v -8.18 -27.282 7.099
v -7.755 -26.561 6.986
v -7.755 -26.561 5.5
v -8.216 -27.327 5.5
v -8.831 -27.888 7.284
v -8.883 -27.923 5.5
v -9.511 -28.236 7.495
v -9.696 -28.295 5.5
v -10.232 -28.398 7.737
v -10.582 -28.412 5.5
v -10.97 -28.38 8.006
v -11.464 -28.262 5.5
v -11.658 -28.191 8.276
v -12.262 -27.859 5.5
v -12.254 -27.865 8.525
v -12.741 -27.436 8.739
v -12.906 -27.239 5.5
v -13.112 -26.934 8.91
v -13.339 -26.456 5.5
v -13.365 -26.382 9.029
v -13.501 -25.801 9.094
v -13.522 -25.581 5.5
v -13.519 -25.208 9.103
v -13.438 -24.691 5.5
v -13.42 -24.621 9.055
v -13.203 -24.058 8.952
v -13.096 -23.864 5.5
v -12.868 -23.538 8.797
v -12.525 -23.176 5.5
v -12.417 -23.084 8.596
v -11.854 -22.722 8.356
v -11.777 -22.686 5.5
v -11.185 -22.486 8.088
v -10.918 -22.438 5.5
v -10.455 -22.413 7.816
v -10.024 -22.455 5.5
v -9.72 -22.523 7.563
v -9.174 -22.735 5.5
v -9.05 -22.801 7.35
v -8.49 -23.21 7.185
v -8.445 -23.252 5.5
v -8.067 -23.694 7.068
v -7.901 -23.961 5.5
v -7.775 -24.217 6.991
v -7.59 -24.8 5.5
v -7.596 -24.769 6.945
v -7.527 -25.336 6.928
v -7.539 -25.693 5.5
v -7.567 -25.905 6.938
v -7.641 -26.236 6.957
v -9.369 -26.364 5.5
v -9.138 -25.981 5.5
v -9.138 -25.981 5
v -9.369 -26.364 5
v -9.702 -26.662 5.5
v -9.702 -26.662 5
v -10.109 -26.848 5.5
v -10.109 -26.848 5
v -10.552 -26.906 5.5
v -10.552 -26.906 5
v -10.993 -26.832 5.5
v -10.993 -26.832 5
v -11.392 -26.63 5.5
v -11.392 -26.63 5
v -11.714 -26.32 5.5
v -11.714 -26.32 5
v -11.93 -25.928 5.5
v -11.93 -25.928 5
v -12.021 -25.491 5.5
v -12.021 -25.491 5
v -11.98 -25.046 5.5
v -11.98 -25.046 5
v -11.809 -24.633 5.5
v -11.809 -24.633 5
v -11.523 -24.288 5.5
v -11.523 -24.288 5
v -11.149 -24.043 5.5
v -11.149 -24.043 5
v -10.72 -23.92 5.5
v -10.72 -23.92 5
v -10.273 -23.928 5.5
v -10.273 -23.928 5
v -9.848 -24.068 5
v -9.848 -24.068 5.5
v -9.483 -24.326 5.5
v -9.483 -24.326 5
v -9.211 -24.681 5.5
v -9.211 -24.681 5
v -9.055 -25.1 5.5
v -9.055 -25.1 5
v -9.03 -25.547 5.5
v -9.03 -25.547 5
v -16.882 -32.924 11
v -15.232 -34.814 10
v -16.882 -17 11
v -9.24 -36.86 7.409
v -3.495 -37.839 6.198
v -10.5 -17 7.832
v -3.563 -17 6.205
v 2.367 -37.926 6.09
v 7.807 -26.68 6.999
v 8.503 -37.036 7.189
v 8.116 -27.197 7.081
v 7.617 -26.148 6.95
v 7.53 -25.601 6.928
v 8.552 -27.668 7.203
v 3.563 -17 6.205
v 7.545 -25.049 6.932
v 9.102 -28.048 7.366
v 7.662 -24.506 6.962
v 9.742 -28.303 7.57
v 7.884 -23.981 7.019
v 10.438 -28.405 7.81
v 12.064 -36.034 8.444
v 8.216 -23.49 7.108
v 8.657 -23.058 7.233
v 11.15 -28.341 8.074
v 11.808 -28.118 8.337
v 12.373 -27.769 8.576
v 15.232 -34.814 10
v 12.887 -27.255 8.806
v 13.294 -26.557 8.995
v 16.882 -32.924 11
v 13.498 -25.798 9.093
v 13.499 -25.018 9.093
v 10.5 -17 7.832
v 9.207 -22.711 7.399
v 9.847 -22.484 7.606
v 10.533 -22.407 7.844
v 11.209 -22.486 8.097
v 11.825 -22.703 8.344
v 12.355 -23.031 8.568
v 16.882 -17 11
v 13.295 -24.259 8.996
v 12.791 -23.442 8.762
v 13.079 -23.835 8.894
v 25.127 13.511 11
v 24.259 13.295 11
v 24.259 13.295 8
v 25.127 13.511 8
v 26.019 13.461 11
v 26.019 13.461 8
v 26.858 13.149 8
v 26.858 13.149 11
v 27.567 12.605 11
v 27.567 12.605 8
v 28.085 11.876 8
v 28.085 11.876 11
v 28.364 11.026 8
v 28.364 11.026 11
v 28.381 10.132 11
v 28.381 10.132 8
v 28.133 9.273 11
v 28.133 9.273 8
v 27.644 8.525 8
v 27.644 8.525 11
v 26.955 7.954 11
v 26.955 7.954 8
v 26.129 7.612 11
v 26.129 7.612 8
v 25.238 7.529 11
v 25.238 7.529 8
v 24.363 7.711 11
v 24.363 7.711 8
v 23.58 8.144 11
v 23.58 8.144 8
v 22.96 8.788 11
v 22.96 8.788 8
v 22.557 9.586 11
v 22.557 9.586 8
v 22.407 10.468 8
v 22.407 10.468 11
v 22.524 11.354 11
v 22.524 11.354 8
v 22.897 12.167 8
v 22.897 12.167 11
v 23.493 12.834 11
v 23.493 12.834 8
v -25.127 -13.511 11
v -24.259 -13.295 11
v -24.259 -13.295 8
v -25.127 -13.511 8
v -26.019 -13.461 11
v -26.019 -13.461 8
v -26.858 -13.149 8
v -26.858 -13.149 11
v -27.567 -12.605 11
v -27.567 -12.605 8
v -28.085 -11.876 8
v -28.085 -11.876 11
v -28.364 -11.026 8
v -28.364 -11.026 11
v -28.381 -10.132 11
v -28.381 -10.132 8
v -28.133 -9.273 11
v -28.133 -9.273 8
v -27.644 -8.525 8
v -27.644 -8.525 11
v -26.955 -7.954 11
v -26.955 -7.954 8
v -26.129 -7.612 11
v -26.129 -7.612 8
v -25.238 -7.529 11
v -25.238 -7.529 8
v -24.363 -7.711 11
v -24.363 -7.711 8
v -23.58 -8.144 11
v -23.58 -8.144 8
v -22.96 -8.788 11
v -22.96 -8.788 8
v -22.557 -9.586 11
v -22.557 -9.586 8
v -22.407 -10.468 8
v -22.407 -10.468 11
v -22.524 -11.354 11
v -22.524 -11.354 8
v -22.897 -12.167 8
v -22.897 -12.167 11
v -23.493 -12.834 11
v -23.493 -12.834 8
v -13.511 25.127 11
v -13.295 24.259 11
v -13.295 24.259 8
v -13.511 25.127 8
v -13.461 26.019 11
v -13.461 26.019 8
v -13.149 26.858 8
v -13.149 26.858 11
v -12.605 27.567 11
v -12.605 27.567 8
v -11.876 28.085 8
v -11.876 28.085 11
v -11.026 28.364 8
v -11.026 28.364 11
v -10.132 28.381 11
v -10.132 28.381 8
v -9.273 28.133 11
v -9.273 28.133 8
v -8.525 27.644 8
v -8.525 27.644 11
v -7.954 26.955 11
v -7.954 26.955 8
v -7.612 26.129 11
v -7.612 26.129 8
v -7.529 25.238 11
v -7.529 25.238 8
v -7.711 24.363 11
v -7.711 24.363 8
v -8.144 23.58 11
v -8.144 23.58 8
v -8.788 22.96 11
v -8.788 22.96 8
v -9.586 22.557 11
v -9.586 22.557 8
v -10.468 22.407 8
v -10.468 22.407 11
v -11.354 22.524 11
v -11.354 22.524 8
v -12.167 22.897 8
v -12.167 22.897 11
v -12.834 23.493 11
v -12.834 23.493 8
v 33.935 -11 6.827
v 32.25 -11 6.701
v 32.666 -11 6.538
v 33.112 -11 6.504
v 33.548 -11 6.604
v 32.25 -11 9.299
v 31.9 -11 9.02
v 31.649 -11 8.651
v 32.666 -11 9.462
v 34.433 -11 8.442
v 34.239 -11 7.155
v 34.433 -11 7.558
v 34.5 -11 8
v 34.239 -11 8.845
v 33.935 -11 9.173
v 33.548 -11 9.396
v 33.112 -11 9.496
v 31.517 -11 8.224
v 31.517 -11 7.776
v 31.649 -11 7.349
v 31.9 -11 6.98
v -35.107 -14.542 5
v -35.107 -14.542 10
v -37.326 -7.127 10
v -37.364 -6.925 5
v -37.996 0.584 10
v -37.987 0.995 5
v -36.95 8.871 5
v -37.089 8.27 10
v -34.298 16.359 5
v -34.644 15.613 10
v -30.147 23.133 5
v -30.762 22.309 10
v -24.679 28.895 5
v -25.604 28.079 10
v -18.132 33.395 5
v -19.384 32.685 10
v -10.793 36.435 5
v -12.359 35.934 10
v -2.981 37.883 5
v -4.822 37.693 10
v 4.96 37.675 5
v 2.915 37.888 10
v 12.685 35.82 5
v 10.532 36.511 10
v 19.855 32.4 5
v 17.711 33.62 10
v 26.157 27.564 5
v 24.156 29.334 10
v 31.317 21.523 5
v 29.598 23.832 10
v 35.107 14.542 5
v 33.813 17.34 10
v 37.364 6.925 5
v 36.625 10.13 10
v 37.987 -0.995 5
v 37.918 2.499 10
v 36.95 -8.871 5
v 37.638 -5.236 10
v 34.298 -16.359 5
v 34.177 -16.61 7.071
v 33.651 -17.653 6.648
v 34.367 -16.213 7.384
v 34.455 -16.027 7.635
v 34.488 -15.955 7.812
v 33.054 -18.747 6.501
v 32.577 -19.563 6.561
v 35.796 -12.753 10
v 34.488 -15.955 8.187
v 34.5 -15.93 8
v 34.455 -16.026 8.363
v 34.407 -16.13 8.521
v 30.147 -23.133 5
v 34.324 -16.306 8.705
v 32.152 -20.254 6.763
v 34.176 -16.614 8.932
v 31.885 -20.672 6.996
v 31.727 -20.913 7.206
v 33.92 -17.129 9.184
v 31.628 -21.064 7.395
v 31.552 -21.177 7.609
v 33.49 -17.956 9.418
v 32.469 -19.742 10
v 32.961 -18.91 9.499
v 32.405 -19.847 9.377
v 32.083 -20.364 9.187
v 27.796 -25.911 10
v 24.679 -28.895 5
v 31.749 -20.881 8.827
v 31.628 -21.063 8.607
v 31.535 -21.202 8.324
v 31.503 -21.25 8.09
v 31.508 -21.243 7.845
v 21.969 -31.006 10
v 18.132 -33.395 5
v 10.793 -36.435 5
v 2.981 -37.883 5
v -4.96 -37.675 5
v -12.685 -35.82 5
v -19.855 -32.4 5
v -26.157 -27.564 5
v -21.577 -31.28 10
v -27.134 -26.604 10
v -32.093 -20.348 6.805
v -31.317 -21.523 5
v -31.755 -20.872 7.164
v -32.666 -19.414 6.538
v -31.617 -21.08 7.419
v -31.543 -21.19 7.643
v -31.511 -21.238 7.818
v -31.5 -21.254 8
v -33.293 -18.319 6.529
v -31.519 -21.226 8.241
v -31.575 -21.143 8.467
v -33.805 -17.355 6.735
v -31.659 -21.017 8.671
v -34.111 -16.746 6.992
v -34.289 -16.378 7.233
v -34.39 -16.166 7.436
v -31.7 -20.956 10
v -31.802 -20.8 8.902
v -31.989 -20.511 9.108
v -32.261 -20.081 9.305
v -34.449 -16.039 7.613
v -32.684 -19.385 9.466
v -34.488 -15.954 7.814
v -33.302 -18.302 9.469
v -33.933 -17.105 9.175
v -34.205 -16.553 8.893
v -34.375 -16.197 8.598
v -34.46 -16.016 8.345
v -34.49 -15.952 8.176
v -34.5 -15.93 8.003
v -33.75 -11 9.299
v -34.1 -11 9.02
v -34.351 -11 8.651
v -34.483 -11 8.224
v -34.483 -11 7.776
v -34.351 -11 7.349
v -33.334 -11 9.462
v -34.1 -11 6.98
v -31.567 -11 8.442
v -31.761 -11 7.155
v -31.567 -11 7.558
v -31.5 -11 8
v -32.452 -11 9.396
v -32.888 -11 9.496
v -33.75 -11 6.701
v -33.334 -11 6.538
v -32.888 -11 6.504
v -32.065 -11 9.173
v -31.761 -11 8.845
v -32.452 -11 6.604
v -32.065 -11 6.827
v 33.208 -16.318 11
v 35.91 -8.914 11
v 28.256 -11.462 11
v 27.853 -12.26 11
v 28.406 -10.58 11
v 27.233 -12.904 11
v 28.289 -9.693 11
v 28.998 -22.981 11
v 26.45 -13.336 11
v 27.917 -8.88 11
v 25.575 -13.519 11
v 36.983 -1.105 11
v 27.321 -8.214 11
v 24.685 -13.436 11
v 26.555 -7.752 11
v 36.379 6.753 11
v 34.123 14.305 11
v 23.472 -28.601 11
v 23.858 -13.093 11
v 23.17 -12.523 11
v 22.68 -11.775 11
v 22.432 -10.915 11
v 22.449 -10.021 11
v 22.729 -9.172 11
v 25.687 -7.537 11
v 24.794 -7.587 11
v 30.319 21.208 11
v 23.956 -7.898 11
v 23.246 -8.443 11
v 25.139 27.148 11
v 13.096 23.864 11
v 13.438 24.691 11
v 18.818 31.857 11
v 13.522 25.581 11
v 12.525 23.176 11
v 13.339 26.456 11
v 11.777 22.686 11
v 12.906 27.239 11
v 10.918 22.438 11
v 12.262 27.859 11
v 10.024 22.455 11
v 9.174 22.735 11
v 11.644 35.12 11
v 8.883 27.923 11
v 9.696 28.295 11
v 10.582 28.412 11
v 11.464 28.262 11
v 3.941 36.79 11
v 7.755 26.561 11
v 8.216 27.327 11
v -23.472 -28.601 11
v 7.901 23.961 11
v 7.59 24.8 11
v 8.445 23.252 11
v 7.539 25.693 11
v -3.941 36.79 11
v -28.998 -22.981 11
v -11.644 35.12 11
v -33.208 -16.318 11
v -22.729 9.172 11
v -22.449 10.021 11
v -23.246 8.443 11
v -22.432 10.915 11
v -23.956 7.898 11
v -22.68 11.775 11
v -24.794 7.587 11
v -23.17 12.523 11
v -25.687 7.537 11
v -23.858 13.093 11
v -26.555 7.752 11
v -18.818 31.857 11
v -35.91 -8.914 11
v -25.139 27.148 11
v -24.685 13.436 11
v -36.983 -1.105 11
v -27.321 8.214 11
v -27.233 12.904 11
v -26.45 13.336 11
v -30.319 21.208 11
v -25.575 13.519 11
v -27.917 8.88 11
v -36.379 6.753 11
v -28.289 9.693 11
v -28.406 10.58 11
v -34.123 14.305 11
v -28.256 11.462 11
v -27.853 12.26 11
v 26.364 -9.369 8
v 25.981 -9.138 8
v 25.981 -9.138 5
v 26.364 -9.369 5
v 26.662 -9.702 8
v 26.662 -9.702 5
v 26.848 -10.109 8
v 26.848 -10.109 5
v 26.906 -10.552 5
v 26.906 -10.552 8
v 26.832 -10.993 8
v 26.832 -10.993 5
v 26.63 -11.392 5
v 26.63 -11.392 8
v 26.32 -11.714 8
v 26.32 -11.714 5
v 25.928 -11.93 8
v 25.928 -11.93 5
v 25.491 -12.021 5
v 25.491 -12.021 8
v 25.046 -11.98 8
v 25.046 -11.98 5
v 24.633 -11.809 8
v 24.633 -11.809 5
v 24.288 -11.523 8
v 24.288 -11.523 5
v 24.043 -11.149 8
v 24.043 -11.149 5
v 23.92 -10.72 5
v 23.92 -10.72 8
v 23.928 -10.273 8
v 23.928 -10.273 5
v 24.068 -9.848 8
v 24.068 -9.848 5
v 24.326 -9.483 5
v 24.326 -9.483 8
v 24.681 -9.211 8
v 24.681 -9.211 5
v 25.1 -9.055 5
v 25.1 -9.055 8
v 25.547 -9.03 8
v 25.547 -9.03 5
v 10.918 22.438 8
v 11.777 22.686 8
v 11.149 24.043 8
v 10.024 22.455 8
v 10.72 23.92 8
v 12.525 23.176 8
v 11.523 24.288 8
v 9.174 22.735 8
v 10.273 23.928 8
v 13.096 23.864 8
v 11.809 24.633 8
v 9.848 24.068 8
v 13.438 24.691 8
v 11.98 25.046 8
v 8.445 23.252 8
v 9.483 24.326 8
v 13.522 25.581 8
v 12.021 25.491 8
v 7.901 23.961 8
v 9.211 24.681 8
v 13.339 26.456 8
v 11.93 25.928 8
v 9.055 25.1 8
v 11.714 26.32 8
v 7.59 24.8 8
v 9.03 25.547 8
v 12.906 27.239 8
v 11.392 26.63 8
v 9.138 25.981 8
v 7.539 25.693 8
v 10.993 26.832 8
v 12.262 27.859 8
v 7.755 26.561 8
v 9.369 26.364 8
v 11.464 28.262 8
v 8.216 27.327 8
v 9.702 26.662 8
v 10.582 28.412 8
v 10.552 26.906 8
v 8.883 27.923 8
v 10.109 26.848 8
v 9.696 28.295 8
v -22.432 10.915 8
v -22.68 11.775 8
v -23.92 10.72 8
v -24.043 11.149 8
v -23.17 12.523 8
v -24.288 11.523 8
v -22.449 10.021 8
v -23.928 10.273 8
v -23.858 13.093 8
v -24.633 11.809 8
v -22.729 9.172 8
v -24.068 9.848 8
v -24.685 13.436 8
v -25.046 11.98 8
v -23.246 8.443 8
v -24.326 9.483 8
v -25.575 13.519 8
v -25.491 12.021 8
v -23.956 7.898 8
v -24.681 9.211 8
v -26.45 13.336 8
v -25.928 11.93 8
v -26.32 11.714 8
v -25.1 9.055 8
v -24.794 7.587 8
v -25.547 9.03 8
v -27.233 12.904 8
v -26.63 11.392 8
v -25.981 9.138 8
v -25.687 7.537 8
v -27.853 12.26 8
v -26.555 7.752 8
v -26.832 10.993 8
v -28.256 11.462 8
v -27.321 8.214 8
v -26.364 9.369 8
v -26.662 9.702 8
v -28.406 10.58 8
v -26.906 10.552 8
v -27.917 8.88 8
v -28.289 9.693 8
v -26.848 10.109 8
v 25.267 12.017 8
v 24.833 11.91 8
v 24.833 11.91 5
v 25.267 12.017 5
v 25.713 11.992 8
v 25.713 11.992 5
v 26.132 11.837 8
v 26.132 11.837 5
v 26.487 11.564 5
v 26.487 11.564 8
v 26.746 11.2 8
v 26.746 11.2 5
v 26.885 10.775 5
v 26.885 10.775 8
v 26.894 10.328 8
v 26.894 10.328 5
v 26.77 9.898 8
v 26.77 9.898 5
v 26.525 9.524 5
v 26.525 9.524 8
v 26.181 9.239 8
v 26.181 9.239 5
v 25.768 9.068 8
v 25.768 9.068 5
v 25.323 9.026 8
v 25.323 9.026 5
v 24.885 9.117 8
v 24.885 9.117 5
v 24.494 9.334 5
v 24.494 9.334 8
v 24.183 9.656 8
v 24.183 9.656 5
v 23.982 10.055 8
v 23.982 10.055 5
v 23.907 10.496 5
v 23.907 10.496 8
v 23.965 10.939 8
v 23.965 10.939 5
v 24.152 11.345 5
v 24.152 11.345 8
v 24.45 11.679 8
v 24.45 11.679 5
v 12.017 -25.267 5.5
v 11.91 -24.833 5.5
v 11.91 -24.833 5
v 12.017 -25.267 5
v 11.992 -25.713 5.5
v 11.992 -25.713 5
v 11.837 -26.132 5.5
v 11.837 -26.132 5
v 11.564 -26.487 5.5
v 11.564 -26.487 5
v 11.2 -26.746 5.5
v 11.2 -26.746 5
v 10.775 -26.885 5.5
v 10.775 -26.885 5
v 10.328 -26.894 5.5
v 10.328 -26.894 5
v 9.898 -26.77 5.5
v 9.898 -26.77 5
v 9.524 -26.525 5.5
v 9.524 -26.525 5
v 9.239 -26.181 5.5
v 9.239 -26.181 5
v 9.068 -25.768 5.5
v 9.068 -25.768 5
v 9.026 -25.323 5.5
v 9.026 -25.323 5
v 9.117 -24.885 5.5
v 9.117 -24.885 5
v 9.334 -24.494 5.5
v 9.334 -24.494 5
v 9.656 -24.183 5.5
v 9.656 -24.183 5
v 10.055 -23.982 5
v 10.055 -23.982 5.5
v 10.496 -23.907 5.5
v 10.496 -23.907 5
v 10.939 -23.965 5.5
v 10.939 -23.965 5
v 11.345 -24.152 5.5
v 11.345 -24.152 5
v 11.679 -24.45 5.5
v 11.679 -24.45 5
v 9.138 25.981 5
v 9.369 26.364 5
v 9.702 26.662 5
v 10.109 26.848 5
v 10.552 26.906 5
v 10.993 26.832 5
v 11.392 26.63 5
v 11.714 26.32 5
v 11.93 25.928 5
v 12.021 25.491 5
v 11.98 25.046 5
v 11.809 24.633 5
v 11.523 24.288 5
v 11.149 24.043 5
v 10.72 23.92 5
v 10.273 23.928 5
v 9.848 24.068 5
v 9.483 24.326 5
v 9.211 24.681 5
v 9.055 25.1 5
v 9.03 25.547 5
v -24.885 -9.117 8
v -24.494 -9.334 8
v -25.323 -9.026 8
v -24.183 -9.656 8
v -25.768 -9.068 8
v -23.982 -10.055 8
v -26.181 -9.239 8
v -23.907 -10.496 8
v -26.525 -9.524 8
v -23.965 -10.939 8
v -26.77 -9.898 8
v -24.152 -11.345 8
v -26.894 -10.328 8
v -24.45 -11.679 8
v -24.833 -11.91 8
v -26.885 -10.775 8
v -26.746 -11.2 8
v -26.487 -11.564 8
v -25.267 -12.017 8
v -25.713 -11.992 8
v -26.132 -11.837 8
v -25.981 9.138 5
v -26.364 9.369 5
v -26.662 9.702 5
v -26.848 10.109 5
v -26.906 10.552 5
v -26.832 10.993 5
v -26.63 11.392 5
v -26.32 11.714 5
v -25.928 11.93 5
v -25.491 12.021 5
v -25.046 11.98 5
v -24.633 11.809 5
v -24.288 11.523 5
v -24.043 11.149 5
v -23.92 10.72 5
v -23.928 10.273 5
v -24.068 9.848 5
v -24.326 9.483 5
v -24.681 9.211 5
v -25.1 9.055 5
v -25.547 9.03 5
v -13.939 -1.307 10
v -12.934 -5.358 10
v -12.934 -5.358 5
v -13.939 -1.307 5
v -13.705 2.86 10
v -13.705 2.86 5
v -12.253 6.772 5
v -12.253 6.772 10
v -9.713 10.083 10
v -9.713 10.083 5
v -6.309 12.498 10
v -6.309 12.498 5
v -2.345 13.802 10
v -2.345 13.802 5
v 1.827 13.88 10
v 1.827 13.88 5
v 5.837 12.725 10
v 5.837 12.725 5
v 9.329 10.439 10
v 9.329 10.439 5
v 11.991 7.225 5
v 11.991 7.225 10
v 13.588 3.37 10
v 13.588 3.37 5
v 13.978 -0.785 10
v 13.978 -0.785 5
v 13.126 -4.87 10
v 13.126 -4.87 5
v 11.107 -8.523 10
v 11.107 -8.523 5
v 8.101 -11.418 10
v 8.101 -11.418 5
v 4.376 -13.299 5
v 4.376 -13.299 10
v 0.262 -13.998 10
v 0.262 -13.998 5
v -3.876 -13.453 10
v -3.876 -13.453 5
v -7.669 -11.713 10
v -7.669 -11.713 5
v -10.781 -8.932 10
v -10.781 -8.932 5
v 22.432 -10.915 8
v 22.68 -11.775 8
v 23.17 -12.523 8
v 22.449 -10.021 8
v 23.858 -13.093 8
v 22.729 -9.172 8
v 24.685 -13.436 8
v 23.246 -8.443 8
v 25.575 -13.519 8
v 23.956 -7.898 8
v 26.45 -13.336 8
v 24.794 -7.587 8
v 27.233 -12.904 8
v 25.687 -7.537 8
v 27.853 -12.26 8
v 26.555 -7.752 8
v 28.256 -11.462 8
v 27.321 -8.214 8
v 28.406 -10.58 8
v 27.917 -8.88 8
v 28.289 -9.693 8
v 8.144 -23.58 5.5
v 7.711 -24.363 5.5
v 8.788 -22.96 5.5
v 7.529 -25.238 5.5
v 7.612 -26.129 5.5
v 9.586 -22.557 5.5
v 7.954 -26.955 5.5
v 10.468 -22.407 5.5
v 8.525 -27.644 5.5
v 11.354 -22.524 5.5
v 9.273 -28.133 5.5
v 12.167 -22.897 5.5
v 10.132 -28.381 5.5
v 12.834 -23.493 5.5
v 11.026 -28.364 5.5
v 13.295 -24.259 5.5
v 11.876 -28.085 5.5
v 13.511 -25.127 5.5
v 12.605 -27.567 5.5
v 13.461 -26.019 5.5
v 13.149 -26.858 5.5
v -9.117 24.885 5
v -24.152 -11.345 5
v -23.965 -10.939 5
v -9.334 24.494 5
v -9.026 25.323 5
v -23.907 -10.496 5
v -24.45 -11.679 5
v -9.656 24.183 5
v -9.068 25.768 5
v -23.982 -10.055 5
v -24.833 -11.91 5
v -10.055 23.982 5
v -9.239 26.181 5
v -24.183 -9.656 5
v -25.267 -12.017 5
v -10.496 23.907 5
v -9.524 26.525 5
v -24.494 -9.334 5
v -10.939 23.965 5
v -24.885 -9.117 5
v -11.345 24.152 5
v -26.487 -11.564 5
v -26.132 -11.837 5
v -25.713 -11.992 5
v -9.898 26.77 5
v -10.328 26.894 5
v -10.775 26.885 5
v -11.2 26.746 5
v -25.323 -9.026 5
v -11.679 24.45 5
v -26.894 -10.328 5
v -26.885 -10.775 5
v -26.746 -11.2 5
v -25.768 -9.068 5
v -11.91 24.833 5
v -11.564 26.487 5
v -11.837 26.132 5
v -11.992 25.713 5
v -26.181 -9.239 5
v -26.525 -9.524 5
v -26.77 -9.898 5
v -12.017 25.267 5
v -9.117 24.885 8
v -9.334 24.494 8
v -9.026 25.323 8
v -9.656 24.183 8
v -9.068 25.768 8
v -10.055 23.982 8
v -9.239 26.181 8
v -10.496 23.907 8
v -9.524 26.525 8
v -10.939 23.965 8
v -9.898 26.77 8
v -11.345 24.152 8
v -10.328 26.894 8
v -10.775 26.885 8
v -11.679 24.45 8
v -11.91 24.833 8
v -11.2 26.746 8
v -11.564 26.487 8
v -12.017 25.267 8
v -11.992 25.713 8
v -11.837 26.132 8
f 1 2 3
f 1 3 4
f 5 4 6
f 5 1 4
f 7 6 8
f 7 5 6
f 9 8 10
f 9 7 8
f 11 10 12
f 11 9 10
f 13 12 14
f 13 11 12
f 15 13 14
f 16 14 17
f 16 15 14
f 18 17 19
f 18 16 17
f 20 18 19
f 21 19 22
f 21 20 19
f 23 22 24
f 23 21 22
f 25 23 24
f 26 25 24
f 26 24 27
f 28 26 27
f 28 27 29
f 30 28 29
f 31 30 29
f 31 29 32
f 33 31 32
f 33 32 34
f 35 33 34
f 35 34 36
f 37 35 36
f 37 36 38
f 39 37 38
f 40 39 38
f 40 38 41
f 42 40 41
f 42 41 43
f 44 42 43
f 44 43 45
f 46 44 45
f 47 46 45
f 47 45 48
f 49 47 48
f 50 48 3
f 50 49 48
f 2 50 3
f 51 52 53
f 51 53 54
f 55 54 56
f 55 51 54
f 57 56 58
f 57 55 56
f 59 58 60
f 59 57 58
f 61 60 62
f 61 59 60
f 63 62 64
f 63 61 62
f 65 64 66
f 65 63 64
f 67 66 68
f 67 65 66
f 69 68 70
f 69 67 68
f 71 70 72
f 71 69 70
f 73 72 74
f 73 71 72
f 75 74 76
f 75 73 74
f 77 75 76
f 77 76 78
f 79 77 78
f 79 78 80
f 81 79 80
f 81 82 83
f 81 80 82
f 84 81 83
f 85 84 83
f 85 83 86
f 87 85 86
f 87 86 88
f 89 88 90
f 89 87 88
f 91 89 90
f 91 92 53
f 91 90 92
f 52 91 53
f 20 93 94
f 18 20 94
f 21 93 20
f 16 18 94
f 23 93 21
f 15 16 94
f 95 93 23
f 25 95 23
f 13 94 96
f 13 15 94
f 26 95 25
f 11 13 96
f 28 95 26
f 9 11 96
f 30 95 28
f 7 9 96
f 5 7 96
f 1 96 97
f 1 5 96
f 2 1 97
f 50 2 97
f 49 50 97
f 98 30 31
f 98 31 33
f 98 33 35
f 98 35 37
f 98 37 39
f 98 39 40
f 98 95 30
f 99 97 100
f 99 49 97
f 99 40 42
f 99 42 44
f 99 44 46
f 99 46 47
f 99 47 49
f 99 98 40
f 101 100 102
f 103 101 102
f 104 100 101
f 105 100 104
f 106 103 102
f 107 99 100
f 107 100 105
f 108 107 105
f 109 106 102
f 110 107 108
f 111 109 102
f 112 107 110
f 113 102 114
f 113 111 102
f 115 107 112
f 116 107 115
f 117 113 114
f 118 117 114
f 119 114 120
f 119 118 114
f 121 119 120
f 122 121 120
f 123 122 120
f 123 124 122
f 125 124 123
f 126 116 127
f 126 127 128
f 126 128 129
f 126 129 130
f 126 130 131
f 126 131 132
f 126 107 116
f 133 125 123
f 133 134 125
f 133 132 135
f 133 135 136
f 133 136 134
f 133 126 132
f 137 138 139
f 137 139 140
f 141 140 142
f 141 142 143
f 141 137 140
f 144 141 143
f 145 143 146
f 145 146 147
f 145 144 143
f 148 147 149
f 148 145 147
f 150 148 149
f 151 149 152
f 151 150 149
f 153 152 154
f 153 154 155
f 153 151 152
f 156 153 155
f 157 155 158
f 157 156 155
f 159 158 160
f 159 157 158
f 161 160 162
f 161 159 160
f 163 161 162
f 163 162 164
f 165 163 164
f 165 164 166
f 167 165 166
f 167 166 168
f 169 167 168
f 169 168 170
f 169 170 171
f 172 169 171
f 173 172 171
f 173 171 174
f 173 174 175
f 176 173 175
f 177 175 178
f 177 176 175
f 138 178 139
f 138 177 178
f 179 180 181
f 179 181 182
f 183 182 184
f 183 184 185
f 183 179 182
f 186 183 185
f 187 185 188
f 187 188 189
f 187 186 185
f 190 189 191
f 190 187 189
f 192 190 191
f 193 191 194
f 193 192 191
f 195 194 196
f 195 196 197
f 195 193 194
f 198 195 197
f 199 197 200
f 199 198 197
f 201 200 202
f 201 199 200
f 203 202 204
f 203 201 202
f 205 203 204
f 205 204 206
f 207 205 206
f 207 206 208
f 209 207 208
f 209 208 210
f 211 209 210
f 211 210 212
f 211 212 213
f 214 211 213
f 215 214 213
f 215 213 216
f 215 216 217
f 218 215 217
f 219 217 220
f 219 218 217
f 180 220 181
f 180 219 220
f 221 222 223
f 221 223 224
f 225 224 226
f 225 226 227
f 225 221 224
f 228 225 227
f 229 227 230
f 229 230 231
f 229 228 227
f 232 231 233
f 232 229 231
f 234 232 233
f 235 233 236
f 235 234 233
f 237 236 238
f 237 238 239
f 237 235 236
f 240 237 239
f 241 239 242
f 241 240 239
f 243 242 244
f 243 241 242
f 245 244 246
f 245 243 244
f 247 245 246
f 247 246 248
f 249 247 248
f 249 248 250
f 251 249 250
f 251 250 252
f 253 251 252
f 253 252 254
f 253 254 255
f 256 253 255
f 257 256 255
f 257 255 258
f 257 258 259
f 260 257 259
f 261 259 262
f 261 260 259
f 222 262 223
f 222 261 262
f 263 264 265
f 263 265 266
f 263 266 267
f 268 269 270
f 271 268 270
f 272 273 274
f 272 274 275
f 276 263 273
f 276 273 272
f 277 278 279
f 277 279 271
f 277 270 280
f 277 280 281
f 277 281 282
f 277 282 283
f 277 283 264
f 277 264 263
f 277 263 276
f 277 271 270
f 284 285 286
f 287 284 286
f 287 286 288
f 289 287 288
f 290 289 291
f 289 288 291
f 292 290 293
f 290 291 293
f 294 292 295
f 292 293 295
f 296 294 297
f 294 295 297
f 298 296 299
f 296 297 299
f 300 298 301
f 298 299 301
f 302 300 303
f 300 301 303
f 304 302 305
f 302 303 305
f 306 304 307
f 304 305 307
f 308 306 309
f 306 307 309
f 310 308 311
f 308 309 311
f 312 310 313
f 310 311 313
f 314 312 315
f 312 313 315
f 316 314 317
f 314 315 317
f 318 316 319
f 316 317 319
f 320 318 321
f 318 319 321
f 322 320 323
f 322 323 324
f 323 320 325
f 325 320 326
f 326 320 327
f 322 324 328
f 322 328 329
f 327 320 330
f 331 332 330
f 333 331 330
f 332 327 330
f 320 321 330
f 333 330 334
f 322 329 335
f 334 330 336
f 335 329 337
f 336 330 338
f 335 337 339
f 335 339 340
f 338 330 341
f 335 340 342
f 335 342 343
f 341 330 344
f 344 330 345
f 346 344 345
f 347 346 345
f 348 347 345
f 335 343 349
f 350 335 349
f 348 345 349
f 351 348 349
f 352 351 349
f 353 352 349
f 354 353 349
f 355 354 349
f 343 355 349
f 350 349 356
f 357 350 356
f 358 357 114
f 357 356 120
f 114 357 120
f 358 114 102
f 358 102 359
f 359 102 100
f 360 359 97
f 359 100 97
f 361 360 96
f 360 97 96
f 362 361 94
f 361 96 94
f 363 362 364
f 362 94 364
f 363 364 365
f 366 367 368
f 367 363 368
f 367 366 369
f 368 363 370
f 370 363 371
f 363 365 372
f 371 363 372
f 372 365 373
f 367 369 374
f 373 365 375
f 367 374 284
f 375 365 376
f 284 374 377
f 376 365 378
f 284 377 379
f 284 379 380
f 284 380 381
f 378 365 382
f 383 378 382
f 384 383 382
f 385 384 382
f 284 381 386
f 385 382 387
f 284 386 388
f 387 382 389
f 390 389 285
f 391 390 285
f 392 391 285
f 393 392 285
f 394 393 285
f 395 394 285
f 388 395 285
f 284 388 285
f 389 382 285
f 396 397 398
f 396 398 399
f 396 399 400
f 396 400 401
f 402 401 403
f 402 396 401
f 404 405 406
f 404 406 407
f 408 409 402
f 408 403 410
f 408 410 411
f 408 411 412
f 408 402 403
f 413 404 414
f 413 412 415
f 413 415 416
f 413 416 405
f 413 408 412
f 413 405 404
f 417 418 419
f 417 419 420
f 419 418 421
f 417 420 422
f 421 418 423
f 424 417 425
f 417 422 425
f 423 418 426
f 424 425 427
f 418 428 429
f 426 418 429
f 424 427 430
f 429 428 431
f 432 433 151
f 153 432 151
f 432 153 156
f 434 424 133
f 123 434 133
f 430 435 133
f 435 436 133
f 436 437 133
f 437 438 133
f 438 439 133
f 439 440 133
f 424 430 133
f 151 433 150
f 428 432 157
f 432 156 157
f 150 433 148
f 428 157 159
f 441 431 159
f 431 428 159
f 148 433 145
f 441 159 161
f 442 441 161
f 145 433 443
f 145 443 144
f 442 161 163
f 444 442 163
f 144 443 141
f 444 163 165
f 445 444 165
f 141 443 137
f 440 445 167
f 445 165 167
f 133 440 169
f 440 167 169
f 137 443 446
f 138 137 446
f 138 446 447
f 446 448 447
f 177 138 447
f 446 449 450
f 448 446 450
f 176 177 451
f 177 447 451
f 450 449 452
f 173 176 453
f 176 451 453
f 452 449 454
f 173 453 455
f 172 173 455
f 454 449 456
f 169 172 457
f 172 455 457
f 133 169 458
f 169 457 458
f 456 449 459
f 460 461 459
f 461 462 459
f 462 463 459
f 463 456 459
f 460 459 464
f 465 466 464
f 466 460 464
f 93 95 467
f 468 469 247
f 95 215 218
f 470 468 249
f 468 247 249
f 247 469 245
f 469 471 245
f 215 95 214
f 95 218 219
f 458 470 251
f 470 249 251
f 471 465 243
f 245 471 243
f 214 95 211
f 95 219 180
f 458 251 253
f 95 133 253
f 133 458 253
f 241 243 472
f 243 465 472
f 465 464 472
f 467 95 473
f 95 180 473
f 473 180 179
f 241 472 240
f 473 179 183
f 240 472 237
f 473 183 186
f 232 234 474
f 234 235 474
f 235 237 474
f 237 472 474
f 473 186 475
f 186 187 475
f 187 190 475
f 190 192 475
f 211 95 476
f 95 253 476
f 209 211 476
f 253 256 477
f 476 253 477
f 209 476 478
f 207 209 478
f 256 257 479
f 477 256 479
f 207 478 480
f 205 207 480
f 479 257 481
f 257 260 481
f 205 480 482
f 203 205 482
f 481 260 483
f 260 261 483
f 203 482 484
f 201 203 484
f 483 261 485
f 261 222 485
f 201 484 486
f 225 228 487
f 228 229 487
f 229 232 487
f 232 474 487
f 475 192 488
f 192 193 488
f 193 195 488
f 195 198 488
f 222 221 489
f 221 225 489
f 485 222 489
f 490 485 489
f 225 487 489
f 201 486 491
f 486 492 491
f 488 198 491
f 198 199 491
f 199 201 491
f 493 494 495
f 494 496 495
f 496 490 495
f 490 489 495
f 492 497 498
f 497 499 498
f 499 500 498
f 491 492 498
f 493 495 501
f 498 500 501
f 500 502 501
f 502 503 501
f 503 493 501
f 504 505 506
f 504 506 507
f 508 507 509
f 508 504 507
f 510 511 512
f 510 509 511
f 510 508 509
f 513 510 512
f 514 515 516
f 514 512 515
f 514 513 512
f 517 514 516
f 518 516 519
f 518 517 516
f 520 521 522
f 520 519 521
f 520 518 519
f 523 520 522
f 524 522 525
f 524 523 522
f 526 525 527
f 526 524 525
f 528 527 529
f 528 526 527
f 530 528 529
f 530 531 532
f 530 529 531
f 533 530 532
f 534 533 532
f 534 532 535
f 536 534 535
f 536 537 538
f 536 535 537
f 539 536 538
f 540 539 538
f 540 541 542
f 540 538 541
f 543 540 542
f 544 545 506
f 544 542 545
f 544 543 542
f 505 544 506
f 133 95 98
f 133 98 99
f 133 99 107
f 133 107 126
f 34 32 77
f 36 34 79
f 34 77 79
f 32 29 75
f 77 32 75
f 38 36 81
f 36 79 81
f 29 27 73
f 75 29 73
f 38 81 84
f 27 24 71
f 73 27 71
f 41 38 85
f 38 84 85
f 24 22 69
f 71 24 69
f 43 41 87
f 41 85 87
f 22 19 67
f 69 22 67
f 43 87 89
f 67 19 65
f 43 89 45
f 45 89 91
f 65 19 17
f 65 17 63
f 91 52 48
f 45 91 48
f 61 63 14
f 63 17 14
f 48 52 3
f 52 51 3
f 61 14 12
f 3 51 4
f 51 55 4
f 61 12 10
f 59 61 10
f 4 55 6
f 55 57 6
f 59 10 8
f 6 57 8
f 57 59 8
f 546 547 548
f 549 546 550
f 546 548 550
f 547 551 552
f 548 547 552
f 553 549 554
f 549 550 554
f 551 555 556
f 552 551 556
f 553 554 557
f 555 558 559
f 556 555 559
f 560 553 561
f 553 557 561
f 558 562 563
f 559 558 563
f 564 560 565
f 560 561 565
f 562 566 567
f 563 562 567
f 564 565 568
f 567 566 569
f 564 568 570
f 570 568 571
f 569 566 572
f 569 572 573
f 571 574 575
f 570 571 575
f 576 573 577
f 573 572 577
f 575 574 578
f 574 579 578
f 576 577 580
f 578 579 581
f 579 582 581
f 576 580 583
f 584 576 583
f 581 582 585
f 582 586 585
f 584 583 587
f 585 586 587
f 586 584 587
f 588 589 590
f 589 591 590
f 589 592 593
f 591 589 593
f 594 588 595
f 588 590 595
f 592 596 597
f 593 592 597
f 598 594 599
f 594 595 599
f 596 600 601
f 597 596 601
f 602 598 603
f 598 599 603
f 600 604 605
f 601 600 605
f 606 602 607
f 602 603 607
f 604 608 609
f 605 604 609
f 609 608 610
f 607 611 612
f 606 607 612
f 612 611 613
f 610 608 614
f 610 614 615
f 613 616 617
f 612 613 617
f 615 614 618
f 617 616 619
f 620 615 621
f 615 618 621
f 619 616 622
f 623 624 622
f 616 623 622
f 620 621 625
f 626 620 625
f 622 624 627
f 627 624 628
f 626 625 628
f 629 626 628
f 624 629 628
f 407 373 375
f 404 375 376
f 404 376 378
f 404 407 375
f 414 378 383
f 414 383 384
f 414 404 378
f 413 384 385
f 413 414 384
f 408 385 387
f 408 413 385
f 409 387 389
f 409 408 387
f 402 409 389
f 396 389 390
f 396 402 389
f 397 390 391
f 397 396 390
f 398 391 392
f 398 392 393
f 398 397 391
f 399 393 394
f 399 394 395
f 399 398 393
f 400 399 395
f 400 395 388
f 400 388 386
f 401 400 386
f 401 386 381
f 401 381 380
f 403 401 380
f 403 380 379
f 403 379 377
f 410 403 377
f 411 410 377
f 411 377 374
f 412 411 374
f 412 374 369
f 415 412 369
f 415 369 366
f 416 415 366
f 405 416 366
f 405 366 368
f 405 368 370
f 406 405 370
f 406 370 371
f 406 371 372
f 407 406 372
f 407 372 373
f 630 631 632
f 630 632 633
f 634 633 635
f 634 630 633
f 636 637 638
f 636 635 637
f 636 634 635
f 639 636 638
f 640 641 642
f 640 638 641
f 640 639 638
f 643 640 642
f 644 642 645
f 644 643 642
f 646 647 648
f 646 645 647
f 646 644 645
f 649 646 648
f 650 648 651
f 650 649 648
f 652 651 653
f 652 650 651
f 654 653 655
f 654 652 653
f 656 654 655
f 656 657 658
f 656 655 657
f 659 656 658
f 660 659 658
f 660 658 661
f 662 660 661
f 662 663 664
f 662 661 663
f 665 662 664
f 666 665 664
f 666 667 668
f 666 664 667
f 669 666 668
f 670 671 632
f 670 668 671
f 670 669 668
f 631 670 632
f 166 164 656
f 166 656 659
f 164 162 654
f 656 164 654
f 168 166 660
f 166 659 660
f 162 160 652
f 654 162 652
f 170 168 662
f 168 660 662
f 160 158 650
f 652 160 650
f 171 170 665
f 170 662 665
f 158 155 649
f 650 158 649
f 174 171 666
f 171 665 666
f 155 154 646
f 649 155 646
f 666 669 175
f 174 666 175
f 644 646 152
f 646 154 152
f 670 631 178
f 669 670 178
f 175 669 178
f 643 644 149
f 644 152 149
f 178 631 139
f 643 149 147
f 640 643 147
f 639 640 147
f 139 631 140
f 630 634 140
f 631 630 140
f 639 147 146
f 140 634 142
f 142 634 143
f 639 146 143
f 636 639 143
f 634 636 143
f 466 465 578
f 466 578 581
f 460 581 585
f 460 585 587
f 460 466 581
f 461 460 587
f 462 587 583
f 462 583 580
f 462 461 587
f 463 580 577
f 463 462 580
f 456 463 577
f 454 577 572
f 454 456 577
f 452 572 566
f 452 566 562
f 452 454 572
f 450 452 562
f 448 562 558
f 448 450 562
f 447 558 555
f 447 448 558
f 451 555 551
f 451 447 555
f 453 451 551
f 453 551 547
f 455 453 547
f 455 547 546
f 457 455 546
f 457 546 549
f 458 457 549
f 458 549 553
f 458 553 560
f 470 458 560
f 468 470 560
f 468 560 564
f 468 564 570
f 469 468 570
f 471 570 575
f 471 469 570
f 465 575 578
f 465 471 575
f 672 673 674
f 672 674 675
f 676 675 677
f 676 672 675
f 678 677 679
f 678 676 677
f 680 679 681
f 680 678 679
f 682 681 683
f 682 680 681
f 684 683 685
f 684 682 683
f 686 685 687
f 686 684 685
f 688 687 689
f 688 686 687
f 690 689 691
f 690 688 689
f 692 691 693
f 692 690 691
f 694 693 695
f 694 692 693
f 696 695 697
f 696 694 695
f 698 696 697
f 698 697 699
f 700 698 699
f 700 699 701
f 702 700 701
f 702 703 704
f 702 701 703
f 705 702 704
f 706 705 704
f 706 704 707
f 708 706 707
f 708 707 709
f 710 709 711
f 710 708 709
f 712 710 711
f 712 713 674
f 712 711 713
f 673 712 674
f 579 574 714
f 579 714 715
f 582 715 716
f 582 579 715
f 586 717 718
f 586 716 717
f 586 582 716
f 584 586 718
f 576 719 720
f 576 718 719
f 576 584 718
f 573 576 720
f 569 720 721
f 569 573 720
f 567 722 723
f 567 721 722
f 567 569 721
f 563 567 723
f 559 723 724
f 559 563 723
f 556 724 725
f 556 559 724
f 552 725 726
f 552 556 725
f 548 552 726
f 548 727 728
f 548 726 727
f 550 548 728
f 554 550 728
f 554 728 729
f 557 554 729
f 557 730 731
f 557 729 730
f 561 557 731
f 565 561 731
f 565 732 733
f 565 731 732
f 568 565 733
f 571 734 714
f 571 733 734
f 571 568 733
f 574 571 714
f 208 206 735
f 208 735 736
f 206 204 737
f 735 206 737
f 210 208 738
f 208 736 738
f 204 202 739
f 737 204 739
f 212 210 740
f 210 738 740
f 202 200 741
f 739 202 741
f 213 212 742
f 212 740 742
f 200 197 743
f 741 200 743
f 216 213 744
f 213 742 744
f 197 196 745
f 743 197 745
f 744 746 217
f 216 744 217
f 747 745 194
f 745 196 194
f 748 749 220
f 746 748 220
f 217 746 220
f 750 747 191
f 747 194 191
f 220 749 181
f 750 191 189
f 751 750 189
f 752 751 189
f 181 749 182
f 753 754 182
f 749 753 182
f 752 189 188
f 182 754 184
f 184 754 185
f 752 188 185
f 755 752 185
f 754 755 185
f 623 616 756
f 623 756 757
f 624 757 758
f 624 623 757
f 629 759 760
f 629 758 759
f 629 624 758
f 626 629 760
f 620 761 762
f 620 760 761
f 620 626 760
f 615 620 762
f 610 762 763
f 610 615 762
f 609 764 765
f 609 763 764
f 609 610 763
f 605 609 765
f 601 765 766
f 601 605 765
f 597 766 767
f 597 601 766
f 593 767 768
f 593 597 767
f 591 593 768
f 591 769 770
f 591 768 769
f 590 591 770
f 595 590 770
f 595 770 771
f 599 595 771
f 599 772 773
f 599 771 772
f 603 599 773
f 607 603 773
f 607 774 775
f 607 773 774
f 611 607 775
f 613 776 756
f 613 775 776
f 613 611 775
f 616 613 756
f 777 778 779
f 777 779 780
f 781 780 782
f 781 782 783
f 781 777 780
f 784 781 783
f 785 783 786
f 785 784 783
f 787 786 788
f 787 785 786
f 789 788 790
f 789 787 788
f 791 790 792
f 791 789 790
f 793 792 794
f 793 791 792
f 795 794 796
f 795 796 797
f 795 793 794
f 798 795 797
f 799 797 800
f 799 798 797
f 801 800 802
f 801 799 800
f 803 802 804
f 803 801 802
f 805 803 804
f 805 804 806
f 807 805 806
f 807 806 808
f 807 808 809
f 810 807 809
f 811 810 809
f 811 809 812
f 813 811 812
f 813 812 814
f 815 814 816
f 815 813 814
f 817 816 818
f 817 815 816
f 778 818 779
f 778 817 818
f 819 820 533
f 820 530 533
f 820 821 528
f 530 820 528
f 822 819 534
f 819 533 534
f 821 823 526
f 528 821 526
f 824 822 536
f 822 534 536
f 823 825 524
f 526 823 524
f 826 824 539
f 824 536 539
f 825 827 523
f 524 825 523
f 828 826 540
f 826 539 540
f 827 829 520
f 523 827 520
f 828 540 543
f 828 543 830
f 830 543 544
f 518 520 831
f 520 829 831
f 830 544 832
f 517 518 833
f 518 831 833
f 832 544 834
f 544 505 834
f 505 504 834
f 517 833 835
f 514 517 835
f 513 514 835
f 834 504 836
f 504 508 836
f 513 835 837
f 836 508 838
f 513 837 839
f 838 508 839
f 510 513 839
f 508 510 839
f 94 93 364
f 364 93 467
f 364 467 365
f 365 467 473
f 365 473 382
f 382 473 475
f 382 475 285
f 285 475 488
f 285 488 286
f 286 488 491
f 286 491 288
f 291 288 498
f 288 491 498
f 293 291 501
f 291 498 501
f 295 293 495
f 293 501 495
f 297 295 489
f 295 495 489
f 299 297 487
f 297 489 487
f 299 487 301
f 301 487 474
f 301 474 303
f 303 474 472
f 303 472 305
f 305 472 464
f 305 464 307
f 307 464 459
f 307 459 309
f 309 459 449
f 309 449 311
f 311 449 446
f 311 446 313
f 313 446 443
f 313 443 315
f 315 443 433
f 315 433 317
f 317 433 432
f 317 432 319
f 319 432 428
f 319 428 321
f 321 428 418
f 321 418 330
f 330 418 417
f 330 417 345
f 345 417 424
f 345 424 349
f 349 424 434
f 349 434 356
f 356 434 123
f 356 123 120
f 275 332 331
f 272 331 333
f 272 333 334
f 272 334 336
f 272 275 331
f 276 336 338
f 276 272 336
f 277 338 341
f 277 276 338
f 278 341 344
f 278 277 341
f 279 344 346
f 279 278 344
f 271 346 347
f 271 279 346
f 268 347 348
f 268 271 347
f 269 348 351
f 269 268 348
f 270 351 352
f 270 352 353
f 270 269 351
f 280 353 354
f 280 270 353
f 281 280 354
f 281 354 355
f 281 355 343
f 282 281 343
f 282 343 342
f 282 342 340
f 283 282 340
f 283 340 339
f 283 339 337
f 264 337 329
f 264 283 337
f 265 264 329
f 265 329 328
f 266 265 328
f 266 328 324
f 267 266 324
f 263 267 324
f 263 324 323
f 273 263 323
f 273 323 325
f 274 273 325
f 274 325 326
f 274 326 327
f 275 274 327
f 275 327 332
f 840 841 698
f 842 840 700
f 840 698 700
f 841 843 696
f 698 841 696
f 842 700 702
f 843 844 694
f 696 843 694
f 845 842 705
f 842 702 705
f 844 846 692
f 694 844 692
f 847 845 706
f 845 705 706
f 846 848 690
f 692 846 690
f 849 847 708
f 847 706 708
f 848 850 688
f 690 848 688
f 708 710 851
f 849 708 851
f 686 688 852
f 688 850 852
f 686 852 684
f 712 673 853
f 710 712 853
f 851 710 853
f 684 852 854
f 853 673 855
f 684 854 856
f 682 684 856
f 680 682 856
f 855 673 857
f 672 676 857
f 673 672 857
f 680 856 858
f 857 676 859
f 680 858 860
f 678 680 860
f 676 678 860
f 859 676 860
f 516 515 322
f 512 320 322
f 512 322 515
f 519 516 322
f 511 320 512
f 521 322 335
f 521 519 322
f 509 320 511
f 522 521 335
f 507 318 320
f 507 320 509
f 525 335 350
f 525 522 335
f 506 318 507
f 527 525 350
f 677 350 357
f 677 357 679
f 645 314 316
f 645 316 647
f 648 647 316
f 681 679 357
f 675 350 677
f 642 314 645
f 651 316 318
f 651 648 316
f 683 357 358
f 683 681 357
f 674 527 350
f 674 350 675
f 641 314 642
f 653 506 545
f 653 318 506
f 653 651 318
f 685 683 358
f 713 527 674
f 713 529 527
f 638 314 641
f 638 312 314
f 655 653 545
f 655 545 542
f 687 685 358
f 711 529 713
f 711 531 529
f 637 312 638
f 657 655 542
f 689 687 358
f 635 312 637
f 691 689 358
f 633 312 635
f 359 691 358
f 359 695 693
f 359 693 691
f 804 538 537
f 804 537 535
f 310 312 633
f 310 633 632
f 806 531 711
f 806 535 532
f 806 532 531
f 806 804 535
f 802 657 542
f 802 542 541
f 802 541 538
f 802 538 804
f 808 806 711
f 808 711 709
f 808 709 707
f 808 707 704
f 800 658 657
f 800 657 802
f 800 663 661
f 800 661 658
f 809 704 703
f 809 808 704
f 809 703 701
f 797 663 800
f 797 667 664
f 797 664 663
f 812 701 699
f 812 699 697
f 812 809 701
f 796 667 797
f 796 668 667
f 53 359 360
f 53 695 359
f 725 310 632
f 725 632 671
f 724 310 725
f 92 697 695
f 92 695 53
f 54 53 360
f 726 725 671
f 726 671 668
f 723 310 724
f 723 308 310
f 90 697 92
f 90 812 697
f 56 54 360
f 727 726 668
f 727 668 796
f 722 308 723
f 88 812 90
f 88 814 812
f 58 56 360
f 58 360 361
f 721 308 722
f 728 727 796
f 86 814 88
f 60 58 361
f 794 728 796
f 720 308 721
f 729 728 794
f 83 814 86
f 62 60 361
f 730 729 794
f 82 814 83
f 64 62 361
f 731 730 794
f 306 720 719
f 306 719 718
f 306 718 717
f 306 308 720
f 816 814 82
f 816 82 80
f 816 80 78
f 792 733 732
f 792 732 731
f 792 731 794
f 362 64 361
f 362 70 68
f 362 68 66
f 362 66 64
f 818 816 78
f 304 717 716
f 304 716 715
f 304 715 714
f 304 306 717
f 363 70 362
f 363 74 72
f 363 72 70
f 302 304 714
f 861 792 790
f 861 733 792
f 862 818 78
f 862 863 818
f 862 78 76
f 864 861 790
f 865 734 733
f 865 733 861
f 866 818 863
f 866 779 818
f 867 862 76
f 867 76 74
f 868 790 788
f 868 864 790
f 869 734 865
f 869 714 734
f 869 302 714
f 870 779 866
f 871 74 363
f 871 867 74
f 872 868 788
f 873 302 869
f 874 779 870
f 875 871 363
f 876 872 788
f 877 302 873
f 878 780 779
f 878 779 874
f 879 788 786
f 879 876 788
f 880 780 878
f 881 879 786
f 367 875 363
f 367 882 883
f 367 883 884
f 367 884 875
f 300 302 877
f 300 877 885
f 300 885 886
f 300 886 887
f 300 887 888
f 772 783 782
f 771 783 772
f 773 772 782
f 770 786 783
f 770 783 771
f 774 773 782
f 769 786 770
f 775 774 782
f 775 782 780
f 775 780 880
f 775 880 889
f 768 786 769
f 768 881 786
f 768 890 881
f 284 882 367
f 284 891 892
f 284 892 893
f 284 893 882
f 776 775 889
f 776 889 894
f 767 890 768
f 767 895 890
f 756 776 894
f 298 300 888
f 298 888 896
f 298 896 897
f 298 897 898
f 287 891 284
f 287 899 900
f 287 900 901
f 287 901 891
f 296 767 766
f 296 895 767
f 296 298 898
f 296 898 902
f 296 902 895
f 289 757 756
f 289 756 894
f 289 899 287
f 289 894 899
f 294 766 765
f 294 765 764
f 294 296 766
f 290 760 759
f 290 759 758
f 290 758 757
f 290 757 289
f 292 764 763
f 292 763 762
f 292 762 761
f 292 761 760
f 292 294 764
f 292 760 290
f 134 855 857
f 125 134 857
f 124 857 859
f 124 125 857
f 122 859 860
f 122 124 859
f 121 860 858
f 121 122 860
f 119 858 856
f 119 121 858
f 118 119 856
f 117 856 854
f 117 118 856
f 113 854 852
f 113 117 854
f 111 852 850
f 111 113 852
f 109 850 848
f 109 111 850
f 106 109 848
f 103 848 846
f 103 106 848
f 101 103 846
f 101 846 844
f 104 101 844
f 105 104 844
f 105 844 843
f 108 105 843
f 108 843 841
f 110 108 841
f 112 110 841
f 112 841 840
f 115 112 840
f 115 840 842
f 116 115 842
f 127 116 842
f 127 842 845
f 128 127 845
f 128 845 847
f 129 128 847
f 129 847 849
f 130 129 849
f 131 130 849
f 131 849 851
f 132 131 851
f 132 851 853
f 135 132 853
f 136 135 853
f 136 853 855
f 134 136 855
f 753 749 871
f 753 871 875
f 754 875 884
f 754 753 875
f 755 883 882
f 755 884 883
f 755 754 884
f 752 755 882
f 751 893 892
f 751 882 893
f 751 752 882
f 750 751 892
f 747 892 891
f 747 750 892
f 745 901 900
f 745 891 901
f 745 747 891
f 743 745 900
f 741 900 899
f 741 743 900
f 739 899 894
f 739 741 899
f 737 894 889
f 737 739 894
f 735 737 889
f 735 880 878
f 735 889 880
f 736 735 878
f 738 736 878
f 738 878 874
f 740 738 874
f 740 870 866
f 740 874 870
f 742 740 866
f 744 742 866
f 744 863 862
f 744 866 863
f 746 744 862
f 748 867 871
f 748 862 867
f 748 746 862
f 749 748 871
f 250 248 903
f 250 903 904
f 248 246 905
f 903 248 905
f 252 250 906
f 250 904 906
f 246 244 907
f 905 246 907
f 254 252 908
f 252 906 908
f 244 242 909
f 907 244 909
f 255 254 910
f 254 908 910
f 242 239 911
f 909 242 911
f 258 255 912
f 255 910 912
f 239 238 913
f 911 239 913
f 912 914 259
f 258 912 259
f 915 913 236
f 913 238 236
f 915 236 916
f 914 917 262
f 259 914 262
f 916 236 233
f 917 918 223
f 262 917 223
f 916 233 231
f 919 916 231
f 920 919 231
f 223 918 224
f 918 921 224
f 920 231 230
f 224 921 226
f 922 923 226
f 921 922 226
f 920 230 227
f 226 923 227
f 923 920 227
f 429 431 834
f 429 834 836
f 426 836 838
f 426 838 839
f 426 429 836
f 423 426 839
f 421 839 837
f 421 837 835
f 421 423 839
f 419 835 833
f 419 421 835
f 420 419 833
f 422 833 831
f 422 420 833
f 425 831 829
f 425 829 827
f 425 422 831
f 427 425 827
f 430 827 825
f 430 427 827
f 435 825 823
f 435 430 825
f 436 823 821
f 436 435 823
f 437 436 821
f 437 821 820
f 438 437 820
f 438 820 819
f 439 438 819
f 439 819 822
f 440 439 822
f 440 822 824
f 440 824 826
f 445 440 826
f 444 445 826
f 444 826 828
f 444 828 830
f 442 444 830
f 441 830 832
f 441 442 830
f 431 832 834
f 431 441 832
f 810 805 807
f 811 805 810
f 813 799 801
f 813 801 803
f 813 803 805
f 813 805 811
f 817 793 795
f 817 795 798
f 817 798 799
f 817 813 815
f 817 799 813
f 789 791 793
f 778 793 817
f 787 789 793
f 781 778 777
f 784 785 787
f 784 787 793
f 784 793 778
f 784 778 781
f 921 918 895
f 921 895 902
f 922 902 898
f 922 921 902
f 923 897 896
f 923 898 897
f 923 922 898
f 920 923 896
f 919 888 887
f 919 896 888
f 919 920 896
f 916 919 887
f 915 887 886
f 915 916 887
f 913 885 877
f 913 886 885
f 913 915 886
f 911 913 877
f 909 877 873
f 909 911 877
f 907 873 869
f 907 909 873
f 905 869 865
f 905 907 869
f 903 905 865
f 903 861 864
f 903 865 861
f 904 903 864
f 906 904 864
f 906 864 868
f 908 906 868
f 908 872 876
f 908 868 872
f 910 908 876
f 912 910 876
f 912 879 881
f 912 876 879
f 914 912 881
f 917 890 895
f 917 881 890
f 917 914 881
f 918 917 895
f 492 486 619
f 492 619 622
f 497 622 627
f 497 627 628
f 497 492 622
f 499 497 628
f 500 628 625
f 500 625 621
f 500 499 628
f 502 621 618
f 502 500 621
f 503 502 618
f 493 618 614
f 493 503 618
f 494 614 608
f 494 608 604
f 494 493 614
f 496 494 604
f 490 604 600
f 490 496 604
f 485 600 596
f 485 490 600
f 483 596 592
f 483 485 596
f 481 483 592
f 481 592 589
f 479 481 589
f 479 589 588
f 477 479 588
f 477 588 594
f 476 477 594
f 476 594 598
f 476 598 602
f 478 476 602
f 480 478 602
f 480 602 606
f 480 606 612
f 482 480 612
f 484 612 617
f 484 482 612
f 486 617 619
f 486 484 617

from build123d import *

# Parameters (mm, degrees)
CYLINDER2682_R               = 1.5
CYLINDER2682_DEPTH           = 60
CYLINDER2681_R               = 1.5
CYLINDER2681_DEPTH           = 60
TUBE120_R                    = 31
TUBE120_R_2                  = 22
TUBE120_DEPTH                = 24
CYLINDER2647_R               = 14
CYLINDER2647_DEPTH           = 5
CYLINDER2632_R               = 1.5
CYLINDER2632_DEPTH           = 20
CYLINDER2632_PLACEMENT_ANGLE = 45
CYLINDER2640_R               = 1.5
CYLINDER2640_DEPTH           = 20
CYLINDER2633_R               = 1.5
CYLINDER2633_DEPTH           = 20
CYLINDER2633_PLACEMENT_ANGLE = 135
CYLINDER2641_R               = 1.5
CYLINDER2641_DEPTH           = 20
CYLINDER2634_R               = 1.5
CYLINDER2634_DEPTH           = 20
CYLINDER2634_PLACEMENT_ANGLE = 225
CYLINDER2644_R               = 1.5
CYLINDER2644_DEPTH           = 20
CYLINDER2643_R               = 1.5
CYLINDER2643_DEPTH           = 20
CYLINDER2643_PLACEMENT_ANGLE = 45
CYLINDER2646_R               = 1.5
CYLINDER2646_DEPTH           = 20
CYLINDER2635_R               = 3
CYLINDER2635_DEPTH           = 3
CYLINDER2635_PLACEMENT_ANGLE = 45
CYLINDER2636_R               = 3
CYLINDER2636_DEPTH           = 3
CYLINDER2630_R               = 3
CYLINDER2630_DEPTH           = 3
CYLINDER2630_PLACEMENT_ANGLE = 135
CYLINDER2631_R               = 3
CYLINDER2631_DEPTH           = 5
CYLINDER2637_R               = 3
CYLINDER2637_DEPTH           = 5
CYLINDER2637_PLACEMENT_ANGLE = 225
CYLINDER2638_R               = 3
CYLINDER2638_DEPTH           = 3
CYLINDER2639_R               = 3
CYLINDER2639_DEPTH           = 3
CYLINDER2639_PLACEMENT_ANGLE = 45
CYLINDER2642_R               = 3
CYLINDER2642_DEPTH           = 3
CYLINDER2645_R               = 38
CYLINDER2645_DEPTH           = 6
CHAMFER126_SIZE              = 1
CHAMFER126_ROLL_ANGLE        = 180
CHAMFER126_PLACEMENT_ANGLE   = -157.5


with BuildPart() as v_lec2652:
    # Cylinder2682 → Cylinder2682 (new body)
    with BuildSketch(Plane(origin=(33, -10, 8), x_dir=(1, 0, 0), z_dir=(0, -1, 0))):
        Circle(CYLINDER2682_R)
    extrude(amount=CYLINDER2682_DEPTH)


with BuildPart() as compound1193:
    # Cylinder2681 → Cylinder2681 (new body)
    with BuildSketch(Plane(origin=(-33, -10, 8), x_dir=(1, 0, 0), z_dir=(0, -1, 0))):
        Circle(CYLINDER2681_R)
    extrude(amount=CYLINDER2681_DEPTH)

    # Compound1193: union Válec2652
    add(v_lec2652.part)


with BuildPart() as compound1193_1:
    # Compound1193 placement: moved
    add(compound1193.part.moved(Location((0, -1, 0))))


with BuildPart() as tube120:
    # Tube120 → Tube120 (new body)
    with BuildSketch(Plane(origin=(0, -17, 37), x_dir=(1, 0, 0), z_dir=(0, -1, 0))):
        Circle(TUBE120_R)
        Circle(TUBE120_R_2, mode=Mode.SUBTRACT)
    extrude(amount=TUBE120_DEPTH)


with BuildPart() as v_lec2617:
    # Cylinder2647 → Cylinder2647 (new body)
    with BuildSketch(Plane.XY.offset(1)):
        Circle(CYLINDER2647_R)
    extrude(amount=CYLINDER2647_DEPTH)


with BuildPart() as v_lec2602:
    # Cylinder2632 → Cylinder2632 (new body)
    with BuildSketch(Plane.XY):
        Circle(CYLINDER2632_R)
    extrude(amount=CYLINDER2632_DEPTH)


with BuildPart() as v_lec2602_1:
    # Cylinder2632 placement: moved
    add(v_lec2602.part.moved(Location((-19.445436, 19.445436, 19))).rotate(Axis((-19.445436, 19.445436, 19), (0, 0, 1)), CYLINDER2632_PLACEMENT_ANGLE))


with BuildPart() as v_lec2610:
    # Cylinder2640 → Cylinder2640 (new body)
    with BuildSketch(Plane(origin=(-27.5, 0, 19), x_dir=(0, 1, 0), z_dir=(0, 0, 1))):
        Circle(CYLINDER2640_R)
    extrude(amount=CYLINDER2640_DEPTH)


with BuildPart() as v_lec2603:
    # Cylinder2633 → Cylinder2633 (new body)
    with BuildSketch(Plane.XY):
        Circle(CYLINDER2633_R)
    extrude(amount=CYLINDER2633_DEPTH)


with BuildPart() as v_lec2603_1:
    # Cylinder2633 placement: moved
    add(v_lec2603.part.moved(Location((-19.445436, -19.445436, 19))).rotate(Axis((-19.445436, -19.445436, 19), (0, 0, 1)), CYLINDER2633_PLACEMENT_ANGLE))


with BuildPart() as v_lec2611:
    # Cylinder2641 → Cylinder2641 (new body)
    with BuildSketch(Plane(origin=(0, -27.5, 19), x_dir=(-1, 0, 0), z_dir=(0, 0, 1))):
        Circle(CYLINDER2641_R)
    extrude(amount=CYLINDER2641_DEPTH)


with BuildPart() as v_lec2604:
    # Cylinder2634 → Cylinder2634 (new body)
    with BuildSketch(Plane.XY):
        Circle(CYLINDER2634_R)
    extrude(amount=CYLINDER2634_DEPTH)


with BuildPart() as v_lec2604_1:
    # Cylinder2634 placement: moved
    add(v_lec2604.part.moved(Location((19.445436, -19.445436, 19))).rotate(Axis((19.445436, -19.445436, 19), (0, 0, 1)), CYLINDER2634_PLACEMENT_ANGLE))


with BuildPart() as v_lec2614:
    # Cylinder2644 → Cylinder2644 (new body)
    with BuildSketch(Plane(origin=(27.5, 0, 19), x_dir=(0, -1, 0), z_dir=(0, 0, 1))):
        Circle(CYLINDER2644_R)
    extrude(amount=CYLINDER2644_DEPTH)


with BuildPart() as v_lec2613:
    # Cylinder2643 → Cylinder2643 (new body)
    with BuildSketch(Plane.XY):
        Circle(CYLINDER2643_R)
    extrude(amount=CYLINDER2643_DEPTH)


with BuildPart() as v_lec2613_1:
    # Cylinder2643 placement: moved
    add(v_lec2613.part.moved(Location((19.445436, 19.445436, 19))).rotate(Axis((19.445436, 19.445436, 19), (0, 0, -1)), CYLINDER2643_PLACEMENT_ANGLE))


with BuildPart() as compound1169:
    # Cylinder2646 → Cylinder2646 (new body)
    with BuildSketch(Plane(origin=(0, 27.5, 19), x_dir=(1, 0, 0), z_dir=(0, 0, 1))):
        Circle(CYLINDER2646_R)
    extrude(amount=CYLINDER2646_DEPTH)

    # Compound1169: union Válec2602, Válec2610, Válec2603, Válec2611, Válec2604, Válec2614, Válec2613
    add(v_lec2602_1.part)
    add(v_lec2610.part)
    add(v_lec2603_1.part)
    add(v_lec2611.part)
    add(v_lec2604_1.part)
    add(v_lec2614.part)
    add(v_lec2613_1.part)


with BuildPart() as compound1169_1:
    # Compound1169 placement: moved
    add(compound1169.part.moved(Location((0, 0, -23))))


with BuildPart() as v_lec2605:
    # Cylinder2635 → Cylinder2635 (new body)
    with BuildSketch(Plane.XY):
        Circle(CYLINDER2635_R)
    extrude(amount=CYLINDER2635_DEPTH)


with BuildPart() as v_lec2605_1:
    # Cylinder2635 placement: moved
    add(v_lec2605.part.moved(Location((-19.45, 19.45, 19))).rotate(Axis((-19.45, 19.45, 19), (0, 0, 1)), CYLINDER2635_PLACEMENT_ANGLE))


with BuildPart() as v_lec2606:
    # Cylinder2636 → Cylinder2636 (new body)
    with BuildSketch(Plane(origin=(-27.5, 0, 19), x_dir=(0, 1, 0), z_dir=(0, 0, 1))):
        Circle(CYLINDER2636_R)
    extrude(amount=CYLINDER2636_DEPTH)


with BuildPart() as v_lec2600:
    # Cylinder2630 → Cylinder2630 (new body)
    with BuildSketch(Plane.XY):
        Circle(CYLINDER2630_R)
    extrude(amount=CYLINDER2630_DEPTH)


with BuildPart() as v_lec2600_1:
    # Cylinder2630 placement: moved
    add(v_lec2600.part.moved(Location((-19.445436, -19.445436, 19))).rotate(Axis((-19.445436, -19.445436, 19), (0, 0, 1)), CYLINDER2630_PLACEMENT_ANGLE))


with BuildPart() as v_lec2601:
    # Cylinder2631 → Cylinder2631 (new body)
    with BuildSketch(Plane(origin=(0, -27.5, 19.5), x_dir=(-1, 0, 0), z_dir=(0, 0, 1))):
        Circle(CYLINDER2631_R)
    extrude(amount=CYLINDER2631_DEPTH)


with BuildPart() as v_lec2607:
    # Cylinder2637 → Cylinder2637 (new body)
    with BuildSketch(Plane.XY):
        Circle(CYLINDER2637_R)
    extrude(amount=CYLINDER2637_DEPTH)


with BuildPart() as v_lec2607_1:
    # Cylinder2637 placement: moved
    add(v_lec2607.part.moved(Location((19.45, -19.45, 19.5))).rotate(Axis((19.45, -19.45, 19.5), (0, 0, 1)), CYLINDER2637_PLACEMENT_ANGLE))


with BuildPart() as v_lec2608:
    # Cylinder2638 → Cylinder2638 (new body)
    with BuildSketch(Plane(origin=(27.5, 0, 19), x_dir=(0, -1, 0), z_dir=(0, 0, 1))):
        Circle(CYLINDER2638_R)
    extrude(amount=CYLINDER2638_DEPTH)


with BuildPart() as v_lec2609:
    # Cylinder2639 → Cylinder2639 (new body)
    with BuildSketch(Plane.XY):
        Circle(CYLINDER2639_R)
    extrude(amount=CYLINDER2639_DEPTH)


with BuildPart() as v_lec2609_1:
    # Cylinder2639 placement: moved
    add(v_lec2609.part.moved(Location((19.445436, 19.445436, 19))).rotate(Axis((19.445436, 19.445436, 19), (0, 0, -1)), CYLINDER2639_PLACEMENT_ANGLE))


with BuildPart() as compound1170:
    # Cylinder2642 → Cylinder2642 (new body)
    with BuildSketch(Plane(origin=(0, 27.5, 19), x_dir=(1, 0, 0), z_dir=(0, 0, 1))):
        Circle(CYLINDER2642_R)
    extrude(amount=CYLINDER2642_DEPTH)

    # Compound1170: union Válec2605, Válec2606, Válec2600, Válec2601, Válec2607, Válec2608, Válec2609
    add(v_lec2605_1.part)
    add(v_lec2606.part)
    add(v_lec2600_1.part)
    add(v_lec2601.part)
    add(v_lec2607_1.part)
    add(v_lec2608.part)
    add(v_lec2609_1.part)


with BuildPart() as compound1170_1:
    # Compound1170 placement: moved
    add(compound1170.part.moved(Location((0, 0, -19))))


with BuildPart() as cut1006:
    # Cylinder2645 → Cylinder2645 (new body)
    with BuildSketch(Plane.XY):
        Circle(CYLINDER2645_R)
    extrude(amount=CYLINDER2645_DEPTH)

    # Cut630: cut Compound1170
    add(compound1170_1.part, mode=Mode.SUBTRACT)

    # Cut628: cut Compound1169
    add(compound1169_1.part, mode=Mode.SUBTRACT)

    # Cut629: cut Válec2617
    add(v_lec2617.part, mode=Mode.SUBTRACT)

    # Chamfer126
    chamfer126_edges = [cut1006.edges().sort_by_distance(p)[0] for p in [
        (-38, 0, 0),
    ]]
    chamfer(chamfer126_edges, length=CHAMFER126_SIZE)


with BuildPart() as cut1006_1:
    # Chamfer126 roll: moved
    add(cut1006.part.rotate(Axis((0, 0, 0), (1, 0, 0)), CHAMFER126_ROLL_ANGLE))


with BuildPart() as cut1006_2:
    # Chamfer126 placement: moved
    add(cut1006_1.part.moved(Location((0, 0, 11))).rotate(Axis((0, 0, 11), (0, 0, 1)), CHAMFER126_PLACEMENT_ANGLE))

    # Cut976: cut Tube120
    add(tube120.part, mode=Mode.SUBTRACT)

    # Cut1006: cut Compound1193
    add(compound1193_1.part, mode=Mode.SUBTRACT)


solid = cut1006_2.part
